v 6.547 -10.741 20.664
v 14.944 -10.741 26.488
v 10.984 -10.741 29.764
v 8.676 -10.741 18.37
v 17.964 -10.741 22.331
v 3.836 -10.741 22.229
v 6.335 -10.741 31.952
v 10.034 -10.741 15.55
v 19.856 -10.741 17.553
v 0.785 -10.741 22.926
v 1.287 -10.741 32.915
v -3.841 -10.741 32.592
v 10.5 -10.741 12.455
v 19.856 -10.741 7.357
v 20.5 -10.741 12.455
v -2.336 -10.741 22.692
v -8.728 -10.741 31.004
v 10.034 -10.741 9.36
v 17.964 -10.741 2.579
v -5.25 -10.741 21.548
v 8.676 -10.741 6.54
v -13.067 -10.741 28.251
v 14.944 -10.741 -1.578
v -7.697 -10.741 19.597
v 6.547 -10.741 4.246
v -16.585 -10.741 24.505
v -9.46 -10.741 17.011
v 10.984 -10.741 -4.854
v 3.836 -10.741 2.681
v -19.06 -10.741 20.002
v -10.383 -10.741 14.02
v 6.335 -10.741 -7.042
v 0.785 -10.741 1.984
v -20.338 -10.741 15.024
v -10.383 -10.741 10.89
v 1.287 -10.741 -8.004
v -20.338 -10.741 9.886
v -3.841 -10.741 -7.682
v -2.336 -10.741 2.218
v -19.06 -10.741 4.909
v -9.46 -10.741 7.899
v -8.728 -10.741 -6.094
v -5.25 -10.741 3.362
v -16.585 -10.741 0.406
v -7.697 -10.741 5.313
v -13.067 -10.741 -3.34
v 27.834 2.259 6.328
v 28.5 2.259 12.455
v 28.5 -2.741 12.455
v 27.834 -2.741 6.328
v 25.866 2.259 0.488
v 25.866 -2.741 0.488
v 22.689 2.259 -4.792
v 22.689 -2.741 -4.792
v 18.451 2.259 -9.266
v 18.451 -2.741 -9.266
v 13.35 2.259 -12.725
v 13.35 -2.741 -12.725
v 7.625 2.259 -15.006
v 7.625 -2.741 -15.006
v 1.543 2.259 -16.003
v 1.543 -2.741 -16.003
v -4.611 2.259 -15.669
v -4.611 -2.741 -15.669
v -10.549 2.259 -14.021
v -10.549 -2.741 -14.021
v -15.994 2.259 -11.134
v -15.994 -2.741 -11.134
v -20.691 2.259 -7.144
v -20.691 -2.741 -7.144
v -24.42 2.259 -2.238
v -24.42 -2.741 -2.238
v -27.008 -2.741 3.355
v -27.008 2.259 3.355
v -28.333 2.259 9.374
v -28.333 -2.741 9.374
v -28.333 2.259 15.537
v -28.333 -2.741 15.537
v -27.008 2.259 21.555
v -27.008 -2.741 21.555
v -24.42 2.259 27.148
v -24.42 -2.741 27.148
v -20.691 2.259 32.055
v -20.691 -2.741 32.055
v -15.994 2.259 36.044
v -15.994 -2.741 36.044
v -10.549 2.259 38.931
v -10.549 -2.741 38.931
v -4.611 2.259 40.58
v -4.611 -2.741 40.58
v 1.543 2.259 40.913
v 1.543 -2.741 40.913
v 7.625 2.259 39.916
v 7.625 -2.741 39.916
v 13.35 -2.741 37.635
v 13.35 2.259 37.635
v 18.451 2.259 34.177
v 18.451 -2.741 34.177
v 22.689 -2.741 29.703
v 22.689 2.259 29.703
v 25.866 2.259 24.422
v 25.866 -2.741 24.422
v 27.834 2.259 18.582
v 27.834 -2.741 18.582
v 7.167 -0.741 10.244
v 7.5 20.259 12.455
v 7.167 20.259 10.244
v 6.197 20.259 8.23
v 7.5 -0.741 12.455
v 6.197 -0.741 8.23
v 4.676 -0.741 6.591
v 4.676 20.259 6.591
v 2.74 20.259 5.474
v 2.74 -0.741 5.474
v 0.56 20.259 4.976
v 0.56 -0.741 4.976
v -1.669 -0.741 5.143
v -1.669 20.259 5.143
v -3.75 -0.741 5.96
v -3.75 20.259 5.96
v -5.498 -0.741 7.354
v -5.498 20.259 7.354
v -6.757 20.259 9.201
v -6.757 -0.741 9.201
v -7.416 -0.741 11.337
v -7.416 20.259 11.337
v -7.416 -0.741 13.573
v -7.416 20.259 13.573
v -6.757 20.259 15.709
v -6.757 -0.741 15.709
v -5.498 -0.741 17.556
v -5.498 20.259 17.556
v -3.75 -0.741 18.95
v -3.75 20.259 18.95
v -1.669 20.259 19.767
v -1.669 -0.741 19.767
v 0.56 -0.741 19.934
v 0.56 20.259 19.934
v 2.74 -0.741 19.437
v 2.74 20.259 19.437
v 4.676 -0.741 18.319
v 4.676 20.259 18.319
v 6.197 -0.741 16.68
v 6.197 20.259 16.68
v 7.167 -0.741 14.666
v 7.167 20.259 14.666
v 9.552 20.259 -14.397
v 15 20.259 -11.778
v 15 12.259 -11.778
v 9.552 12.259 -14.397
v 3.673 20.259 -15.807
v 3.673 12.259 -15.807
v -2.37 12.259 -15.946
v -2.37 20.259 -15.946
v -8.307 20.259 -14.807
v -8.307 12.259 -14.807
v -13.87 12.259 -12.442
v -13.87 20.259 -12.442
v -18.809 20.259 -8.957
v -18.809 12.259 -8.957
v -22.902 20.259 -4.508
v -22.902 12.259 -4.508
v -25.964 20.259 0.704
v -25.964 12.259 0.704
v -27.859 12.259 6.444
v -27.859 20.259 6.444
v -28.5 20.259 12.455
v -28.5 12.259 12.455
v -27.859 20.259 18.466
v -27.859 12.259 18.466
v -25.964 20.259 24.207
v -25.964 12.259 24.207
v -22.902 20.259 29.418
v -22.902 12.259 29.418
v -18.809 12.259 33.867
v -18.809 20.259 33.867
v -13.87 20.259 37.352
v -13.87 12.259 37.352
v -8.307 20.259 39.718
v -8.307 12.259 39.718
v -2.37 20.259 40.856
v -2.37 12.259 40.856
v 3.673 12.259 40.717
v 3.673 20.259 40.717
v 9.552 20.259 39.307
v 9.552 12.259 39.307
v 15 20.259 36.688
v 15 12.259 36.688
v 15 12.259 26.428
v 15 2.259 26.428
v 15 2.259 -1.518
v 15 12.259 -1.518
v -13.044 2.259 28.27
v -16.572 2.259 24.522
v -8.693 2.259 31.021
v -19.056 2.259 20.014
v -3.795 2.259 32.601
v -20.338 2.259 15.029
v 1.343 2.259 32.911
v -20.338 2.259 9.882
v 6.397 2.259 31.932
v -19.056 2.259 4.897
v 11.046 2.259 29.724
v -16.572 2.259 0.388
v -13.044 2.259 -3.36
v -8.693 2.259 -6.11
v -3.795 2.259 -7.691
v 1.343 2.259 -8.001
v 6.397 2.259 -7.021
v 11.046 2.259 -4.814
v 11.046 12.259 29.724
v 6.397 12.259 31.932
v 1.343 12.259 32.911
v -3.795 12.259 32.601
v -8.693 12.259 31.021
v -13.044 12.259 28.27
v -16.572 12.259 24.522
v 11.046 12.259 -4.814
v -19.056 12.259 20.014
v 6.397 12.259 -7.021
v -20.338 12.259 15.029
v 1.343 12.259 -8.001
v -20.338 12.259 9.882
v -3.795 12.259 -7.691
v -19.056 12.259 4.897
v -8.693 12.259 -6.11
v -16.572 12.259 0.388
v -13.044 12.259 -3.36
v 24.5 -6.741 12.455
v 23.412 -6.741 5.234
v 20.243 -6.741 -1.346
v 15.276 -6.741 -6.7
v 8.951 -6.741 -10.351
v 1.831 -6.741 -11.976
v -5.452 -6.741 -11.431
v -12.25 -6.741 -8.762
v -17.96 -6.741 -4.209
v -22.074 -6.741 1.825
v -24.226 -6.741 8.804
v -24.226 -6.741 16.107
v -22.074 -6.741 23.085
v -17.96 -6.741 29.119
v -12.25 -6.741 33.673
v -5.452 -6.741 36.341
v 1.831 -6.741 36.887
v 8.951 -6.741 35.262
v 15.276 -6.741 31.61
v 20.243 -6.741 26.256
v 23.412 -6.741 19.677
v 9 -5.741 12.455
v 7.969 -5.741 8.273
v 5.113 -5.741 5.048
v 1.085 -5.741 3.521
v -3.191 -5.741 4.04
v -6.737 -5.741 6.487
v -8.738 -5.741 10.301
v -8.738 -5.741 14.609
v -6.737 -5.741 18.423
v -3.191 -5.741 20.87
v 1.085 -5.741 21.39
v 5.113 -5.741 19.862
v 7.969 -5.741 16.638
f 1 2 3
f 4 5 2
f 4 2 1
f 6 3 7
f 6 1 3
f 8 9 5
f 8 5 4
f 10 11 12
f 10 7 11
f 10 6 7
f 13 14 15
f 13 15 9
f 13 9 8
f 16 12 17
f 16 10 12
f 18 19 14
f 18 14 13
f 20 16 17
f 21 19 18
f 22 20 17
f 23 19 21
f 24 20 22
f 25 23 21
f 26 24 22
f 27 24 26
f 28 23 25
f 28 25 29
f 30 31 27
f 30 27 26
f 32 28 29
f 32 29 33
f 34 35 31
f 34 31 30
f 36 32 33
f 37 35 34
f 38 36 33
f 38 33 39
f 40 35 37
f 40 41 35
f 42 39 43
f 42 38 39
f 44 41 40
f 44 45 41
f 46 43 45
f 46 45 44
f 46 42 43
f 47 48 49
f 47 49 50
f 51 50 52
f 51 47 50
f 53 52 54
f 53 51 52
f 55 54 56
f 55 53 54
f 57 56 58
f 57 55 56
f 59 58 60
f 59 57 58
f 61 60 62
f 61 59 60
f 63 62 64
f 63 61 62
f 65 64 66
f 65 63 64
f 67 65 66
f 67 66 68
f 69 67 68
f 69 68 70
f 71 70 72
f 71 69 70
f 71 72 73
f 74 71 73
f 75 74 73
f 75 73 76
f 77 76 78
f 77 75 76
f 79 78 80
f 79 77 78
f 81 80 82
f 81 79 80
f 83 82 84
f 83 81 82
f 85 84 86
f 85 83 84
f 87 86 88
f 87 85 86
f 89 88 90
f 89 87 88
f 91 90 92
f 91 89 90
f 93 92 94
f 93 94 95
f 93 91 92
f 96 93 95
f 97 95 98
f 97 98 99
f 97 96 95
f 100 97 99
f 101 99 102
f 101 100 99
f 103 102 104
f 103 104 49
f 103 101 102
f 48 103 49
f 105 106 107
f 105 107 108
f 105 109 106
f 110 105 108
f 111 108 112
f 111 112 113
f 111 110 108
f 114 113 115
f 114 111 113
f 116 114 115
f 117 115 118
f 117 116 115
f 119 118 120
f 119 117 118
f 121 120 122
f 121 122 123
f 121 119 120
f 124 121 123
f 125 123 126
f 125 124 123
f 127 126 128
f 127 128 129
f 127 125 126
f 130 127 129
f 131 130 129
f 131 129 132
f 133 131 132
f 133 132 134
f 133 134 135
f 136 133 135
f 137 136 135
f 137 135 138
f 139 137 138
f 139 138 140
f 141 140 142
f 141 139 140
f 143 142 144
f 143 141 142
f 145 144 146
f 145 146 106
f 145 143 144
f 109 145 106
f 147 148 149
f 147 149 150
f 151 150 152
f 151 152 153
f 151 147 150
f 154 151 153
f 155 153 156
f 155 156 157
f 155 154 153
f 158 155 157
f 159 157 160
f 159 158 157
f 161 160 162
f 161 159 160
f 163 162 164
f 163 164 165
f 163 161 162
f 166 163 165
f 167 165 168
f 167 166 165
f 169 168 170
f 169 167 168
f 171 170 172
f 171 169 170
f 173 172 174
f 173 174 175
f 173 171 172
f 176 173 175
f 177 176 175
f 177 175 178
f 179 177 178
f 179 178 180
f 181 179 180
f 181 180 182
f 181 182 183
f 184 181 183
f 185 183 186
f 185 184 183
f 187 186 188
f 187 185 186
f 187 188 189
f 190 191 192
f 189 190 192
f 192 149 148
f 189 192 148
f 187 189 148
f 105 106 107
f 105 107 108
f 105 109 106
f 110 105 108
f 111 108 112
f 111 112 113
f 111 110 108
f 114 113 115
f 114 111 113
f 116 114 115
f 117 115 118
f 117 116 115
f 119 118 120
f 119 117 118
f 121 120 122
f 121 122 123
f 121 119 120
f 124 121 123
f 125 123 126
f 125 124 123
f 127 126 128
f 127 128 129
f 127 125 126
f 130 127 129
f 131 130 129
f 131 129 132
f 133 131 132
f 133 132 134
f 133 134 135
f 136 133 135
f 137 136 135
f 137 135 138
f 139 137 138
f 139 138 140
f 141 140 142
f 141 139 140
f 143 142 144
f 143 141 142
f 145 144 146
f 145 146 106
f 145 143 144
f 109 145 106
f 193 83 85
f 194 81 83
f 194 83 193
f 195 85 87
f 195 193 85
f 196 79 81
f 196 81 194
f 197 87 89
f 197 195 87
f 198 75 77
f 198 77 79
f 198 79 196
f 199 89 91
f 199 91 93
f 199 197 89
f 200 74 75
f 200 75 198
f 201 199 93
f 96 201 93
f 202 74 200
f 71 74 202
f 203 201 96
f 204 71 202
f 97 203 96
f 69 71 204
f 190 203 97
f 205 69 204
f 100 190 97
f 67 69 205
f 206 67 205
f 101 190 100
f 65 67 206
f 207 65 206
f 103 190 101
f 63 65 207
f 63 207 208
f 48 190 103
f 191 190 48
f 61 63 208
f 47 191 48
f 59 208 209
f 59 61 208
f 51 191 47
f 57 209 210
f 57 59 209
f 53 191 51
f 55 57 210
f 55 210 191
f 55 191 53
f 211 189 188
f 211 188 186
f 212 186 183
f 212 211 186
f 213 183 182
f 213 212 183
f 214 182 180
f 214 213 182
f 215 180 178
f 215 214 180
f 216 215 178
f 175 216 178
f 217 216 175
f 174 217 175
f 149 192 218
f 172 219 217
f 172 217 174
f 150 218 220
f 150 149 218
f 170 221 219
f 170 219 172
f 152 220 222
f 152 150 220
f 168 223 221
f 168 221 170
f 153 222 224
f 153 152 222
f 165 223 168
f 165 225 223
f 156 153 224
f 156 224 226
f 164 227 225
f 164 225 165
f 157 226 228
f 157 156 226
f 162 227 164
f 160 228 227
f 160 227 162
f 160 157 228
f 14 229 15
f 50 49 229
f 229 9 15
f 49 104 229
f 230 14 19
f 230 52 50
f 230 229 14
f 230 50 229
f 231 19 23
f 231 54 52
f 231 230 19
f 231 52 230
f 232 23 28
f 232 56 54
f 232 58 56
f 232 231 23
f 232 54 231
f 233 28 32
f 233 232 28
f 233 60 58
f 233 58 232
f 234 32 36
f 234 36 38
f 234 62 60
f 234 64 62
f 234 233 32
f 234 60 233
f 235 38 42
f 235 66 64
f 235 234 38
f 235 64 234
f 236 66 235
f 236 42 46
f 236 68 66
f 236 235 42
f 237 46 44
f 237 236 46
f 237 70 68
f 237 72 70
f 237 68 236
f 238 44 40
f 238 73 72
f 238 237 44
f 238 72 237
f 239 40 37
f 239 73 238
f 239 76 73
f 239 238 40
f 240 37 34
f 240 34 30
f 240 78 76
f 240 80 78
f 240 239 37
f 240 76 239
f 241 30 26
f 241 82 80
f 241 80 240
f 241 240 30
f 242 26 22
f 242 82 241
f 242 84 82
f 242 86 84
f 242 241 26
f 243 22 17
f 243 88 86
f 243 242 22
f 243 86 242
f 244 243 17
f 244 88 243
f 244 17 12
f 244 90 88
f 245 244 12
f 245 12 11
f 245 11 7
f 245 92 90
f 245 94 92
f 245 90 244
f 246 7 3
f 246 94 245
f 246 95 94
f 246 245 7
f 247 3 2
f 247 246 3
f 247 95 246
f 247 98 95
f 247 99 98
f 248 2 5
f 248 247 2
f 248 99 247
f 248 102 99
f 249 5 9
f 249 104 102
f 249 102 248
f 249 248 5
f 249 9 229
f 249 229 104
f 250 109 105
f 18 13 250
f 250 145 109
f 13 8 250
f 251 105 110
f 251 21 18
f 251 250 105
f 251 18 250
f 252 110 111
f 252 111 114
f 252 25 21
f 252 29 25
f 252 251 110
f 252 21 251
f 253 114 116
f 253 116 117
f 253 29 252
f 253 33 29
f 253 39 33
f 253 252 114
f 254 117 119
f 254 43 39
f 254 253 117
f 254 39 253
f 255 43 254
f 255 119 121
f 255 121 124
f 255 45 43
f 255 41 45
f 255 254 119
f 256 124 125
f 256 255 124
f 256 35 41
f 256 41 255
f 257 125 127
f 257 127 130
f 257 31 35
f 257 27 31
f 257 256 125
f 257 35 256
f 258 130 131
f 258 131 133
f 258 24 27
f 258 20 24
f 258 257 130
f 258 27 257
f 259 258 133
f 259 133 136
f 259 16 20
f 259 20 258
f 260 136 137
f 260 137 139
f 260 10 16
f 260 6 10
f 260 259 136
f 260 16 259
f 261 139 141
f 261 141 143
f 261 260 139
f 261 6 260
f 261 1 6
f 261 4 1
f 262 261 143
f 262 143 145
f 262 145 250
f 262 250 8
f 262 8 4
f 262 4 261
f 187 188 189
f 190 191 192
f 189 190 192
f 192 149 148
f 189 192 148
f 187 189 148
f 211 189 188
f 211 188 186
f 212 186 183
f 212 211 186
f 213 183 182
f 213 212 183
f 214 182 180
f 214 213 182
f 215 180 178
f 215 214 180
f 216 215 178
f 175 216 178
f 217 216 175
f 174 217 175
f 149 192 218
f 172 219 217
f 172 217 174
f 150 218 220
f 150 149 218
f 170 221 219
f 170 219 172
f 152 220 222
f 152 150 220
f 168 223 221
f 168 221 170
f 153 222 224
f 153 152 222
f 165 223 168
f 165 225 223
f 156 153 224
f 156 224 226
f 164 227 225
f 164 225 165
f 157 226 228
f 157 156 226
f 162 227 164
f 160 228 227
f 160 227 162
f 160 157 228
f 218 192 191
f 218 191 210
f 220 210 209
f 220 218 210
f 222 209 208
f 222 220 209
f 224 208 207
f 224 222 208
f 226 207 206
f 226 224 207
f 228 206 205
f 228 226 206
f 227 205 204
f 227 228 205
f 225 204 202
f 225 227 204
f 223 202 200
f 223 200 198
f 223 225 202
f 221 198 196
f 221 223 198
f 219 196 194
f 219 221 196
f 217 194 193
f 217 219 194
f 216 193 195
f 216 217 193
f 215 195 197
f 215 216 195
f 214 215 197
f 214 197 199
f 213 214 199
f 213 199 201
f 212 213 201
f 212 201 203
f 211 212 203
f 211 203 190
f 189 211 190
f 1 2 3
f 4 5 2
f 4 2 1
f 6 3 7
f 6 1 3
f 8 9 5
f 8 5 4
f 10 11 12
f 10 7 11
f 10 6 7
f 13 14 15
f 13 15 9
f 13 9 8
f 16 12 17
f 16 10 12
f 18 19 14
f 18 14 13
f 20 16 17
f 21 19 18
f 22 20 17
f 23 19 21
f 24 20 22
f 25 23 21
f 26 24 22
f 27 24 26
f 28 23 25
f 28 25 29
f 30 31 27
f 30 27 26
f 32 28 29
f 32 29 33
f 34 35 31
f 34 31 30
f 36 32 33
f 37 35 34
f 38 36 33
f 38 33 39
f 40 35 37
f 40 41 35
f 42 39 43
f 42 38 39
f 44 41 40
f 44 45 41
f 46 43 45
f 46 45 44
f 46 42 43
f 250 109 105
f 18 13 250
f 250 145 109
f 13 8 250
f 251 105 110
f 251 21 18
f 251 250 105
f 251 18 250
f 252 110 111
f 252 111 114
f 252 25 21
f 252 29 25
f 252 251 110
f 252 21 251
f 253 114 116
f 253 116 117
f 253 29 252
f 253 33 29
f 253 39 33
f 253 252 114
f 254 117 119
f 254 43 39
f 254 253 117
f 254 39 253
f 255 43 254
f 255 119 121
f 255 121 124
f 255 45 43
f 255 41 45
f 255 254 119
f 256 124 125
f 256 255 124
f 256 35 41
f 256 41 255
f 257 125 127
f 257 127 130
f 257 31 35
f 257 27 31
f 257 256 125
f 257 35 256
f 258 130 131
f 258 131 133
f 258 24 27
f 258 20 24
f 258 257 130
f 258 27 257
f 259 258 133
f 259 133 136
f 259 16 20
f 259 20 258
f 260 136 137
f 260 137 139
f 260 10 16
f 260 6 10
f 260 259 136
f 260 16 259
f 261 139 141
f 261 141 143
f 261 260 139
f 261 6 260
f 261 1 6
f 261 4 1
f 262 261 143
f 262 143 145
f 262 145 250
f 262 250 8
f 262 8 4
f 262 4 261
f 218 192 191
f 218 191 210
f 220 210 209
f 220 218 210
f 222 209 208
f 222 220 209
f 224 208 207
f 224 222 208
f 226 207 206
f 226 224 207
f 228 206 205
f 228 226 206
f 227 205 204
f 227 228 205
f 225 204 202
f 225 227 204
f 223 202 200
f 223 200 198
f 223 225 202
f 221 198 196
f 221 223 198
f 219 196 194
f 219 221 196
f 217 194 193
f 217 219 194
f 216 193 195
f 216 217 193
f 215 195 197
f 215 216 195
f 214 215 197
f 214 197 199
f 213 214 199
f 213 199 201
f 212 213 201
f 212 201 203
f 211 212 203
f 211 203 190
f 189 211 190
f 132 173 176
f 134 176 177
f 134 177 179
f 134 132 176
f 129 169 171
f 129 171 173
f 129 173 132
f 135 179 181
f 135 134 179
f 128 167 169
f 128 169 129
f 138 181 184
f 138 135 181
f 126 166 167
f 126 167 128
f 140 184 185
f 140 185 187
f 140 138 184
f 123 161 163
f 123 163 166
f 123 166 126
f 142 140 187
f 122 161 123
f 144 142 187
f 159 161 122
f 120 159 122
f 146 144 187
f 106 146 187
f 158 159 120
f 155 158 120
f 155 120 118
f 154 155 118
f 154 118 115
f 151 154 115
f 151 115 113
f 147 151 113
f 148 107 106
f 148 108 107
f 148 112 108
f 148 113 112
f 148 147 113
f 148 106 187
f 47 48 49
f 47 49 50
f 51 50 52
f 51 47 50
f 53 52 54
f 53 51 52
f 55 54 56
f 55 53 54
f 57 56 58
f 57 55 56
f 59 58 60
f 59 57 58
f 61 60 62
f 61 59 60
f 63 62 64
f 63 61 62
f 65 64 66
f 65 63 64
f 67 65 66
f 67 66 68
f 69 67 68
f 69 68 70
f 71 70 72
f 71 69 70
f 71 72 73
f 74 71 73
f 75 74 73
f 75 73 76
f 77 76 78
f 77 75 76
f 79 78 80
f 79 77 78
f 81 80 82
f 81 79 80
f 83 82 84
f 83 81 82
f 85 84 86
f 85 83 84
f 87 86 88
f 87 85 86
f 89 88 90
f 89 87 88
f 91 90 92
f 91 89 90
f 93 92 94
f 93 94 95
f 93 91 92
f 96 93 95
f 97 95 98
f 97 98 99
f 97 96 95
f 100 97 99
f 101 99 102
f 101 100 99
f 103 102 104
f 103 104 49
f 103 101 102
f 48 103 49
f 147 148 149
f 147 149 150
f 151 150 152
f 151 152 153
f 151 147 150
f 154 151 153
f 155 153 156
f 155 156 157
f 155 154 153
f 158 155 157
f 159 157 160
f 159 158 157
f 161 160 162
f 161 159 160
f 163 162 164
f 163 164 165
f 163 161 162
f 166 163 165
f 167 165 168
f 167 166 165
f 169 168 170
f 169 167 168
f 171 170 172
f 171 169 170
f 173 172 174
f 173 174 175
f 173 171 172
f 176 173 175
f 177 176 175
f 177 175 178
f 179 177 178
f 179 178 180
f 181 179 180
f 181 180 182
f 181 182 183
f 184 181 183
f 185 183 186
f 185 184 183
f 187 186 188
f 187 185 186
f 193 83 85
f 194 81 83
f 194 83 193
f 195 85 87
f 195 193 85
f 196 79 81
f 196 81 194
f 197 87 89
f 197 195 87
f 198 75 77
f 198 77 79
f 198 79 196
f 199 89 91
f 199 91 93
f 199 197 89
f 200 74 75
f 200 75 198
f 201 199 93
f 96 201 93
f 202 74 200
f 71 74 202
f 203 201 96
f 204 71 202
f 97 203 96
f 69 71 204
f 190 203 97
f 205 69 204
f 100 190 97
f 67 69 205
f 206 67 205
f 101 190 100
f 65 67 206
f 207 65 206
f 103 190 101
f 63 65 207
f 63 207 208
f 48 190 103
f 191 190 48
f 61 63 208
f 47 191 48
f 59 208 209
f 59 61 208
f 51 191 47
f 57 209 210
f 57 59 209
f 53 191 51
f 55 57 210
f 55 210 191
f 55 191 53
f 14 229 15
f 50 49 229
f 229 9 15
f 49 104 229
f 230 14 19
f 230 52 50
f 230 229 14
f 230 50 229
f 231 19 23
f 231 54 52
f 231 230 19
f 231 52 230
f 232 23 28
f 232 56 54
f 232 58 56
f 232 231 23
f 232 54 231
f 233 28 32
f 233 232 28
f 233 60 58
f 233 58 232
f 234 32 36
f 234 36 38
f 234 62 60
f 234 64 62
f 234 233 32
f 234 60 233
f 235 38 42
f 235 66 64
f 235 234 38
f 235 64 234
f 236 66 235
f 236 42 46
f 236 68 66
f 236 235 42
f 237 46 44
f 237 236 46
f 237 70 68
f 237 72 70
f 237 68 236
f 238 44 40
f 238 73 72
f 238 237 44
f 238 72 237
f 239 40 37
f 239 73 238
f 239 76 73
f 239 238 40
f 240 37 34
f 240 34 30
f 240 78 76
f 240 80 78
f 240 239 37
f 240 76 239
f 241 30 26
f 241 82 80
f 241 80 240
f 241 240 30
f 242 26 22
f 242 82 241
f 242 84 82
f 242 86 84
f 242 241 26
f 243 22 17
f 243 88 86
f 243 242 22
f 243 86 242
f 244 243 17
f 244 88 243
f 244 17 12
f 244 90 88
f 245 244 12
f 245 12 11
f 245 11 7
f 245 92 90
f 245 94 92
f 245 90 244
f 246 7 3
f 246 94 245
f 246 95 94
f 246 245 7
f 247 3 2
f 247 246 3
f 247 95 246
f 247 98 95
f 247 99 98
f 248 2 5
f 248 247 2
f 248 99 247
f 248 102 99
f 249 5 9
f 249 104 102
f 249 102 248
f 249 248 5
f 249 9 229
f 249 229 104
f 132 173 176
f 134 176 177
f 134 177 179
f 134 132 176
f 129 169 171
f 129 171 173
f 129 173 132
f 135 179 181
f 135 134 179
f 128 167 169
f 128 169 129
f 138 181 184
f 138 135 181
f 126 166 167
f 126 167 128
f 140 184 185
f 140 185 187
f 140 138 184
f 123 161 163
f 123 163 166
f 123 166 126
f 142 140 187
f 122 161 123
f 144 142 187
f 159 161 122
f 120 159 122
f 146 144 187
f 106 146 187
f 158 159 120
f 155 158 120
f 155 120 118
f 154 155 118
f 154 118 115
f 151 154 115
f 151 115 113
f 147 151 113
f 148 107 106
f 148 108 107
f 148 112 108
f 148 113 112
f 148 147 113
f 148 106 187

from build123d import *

# Parameters (mm, degrees)
ENL_V_MAT_EXTRU_2_DEPTH      = 54.851587997
ENL_V_MAT_EXTRU_2_DEPTH_BACK = 54.851587997
ESQUISSE4_W                  = 13.5
ESQUISSE4_H                  = 19.470096416


# Read off the part's stored shape, not the designer's step: Révolution1
with BuildPart() as part:
    # Révolution1 outline → Révolution1 (revolve)
    with BuildSketch(Plane.XY.offset(12.455129614)):
        Polygon((7.5, 20.258847156), (7.5, -0.741152844), (10.5, -10.741152844), (20.5, -10.741152844), (28.5, -2.741152844), (28.5, 2.258847156), (20.5, 2.258847156), (20.5, 12.258847156), (28.5, 12.258847156), (28.5, 20.258847156), align=None)
    revolve(axis=Axis((0, 0, 12.455129614), (0, 1, 0)))


with BuildPart() as body_2:
    # R_volution1 2 outline → R_volution1 2 (revolve)
    with BuildSketch(Plane.XY.offset(12.455129614)):
        Polygon((20.5, 12.258847156), (28.5, 12.258847156), (28.5, 20.258847156), (7.5, 20.258847156), (7.5, -0.741152844), (10.5, -10.741152844), (20.5, -10.741152844), (28.5, -2.741152844), (28.5, 2.258847156), (20.5, 2.258847156), align=None)
    revolve(axis=Axis((0, 0, 12.455129614), (0, 1, 0)))


with BuildPart() as enl_v_mat_extru_2_tool:
    # Esquisse4 → Enlèv. mat.-Extru.2 (new, two sides: drawn at the far end of the back side and taken through both)
    with BuildSketch(Plane.XY.offset(-ENL_V_MAT_EXTRU_2_DEPTH_BACK)):
        with Locations((21.75, 11.993895364)):
            Rectangle(ESQUISSE4_W, ESQUISSE4_H)
    extrude(amount=ENL_V_MAT_EXTRU_2_DEPTH + ENL_V_MAT_EXTRU_2_DEPTH_BACK)


with BuildPart() as part_1:
    add(part.part)

    # Enlèv. mat.-Extru.2: cut by enl_v_mat_extru_2_tool
    add(enl_v_mat_extru_2_tool.part, mode=Mode.SUBTRACT)


with BuildPart() as body_2_1:
    add(body_2.part)

    # Enlèv. mat.-Extru.2: cut by enl_v_mat_extru_2_tool
    add(enl_v_mat_extru_2_tool.part, mode=Mode.SUBTRACT)


solid = Compound([part_1.part, body_2_1.part])
